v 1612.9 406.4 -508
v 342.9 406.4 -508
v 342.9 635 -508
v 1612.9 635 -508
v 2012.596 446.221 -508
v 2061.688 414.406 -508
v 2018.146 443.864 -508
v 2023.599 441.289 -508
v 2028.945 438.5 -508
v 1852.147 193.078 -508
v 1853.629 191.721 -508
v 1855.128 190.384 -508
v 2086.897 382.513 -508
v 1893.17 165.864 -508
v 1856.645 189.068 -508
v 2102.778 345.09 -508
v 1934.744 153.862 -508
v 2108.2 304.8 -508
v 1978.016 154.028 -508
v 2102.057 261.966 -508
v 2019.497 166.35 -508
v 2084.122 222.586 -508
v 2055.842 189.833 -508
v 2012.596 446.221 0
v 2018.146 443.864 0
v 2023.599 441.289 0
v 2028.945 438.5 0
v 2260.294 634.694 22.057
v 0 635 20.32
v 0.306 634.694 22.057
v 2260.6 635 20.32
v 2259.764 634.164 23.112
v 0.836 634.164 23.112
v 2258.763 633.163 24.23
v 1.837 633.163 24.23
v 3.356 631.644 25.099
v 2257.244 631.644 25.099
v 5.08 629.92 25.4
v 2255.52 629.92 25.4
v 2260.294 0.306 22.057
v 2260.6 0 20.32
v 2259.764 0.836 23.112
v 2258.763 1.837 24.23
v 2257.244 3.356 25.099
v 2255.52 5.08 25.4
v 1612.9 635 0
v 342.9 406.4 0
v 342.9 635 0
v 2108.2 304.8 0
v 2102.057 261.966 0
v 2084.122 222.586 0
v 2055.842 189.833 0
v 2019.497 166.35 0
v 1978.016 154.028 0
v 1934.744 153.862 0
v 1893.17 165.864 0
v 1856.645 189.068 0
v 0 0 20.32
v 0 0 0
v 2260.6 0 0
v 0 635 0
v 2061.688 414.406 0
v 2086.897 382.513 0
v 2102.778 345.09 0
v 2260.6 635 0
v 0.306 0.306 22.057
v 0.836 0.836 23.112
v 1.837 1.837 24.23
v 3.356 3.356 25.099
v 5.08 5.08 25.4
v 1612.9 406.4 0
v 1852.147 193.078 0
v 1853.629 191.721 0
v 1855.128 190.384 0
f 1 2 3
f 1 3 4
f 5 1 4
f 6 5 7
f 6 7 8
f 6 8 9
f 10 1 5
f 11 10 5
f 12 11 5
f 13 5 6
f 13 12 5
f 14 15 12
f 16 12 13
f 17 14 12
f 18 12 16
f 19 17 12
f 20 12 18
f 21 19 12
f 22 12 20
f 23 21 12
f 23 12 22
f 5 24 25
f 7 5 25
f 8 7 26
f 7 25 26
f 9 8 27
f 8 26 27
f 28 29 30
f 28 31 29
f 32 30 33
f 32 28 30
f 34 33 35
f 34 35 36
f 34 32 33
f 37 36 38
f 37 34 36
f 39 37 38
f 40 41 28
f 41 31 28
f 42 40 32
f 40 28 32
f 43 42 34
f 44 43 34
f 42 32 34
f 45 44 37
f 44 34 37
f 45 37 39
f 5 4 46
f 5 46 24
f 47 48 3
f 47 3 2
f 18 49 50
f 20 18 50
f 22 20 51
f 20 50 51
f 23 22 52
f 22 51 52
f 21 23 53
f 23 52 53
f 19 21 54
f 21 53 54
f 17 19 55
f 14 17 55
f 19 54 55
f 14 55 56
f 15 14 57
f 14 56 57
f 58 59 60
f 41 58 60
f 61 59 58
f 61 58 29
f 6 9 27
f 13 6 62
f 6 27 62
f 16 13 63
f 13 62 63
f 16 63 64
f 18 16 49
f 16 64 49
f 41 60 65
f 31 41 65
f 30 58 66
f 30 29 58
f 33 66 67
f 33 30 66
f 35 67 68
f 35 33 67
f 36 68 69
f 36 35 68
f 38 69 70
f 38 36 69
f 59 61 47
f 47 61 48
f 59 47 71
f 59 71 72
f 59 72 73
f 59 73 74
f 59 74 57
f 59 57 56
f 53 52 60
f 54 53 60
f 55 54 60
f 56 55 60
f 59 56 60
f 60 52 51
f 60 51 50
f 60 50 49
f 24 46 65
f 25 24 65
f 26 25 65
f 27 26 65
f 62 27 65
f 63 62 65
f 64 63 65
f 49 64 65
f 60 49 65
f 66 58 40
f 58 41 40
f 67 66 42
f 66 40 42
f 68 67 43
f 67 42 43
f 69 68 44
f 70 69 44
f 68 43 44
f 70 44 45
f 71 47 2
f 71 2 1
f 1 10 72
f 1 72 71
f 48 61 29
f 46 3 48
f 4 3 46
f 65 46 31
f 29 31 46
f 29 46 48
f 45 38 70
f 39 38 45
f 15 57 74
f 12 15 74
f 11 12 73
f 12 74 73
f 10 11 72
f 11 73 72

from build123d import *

# Parameters (mm, degrees)
F0_W     = 2260.6
F0_H     = 635
F1_DEPTH = 25.4
F2_R     = 5.08
F3_W     = 1270
F3_H     = 228.6
F4_DEPTH = 508


with BuildPart() as f1:
    # F0 (on Top) → F1 (new body)
    with BuildSketch(Plane.XY):
        with Locations((1130.3, 317.5)):
            Rectangle(F0_W, F0_H)
    extrude(amount=F1_DEPTH)

    # F2
    f2_edges = [f1.edges().sort_by_distance(p)[0] for p in [
        (0, 317.5, 25.4),
        (1130.3, 0, 25.4),
        (2260.6, 317.5, 25.4),
        (1130.3, 635, 25.4),
    ]]
    fillet(f2_edges, radius=F2_R)

    # F3 (on face) → F4 (join)
    with BuildSketch(Plane(origin=(0, 0, 0), x_dir=(1, 0, 0), z_dir=(0, 0, -1))):
        with Locations((977.9, -520.7)):
            Rectangle(F3_W, F3_H)
        with BuildLine():
            Line((1612.9, -406.4), (1612.9, -635))
            Line((1612.9, -635), (2012.596362, -446.22112))
            ThreePointArc((2012.596362, -446.22112), (1827.078225, -386.38716), (1852.147463, -193.077524))
            Line((1852.147463, -193.077524), (1612.9, -406.4))
        make_face()
        with BuildLine():
            Line((2028.944765, -438.499676), (2012.596362, -446.22112))
            ThreePointArc((2012.596362, -446.22112), (2020.88517, -442.60305), (2028.944765, -438.499676))
        make_face()
        with BuildLine():
            ThreePointArc((1852.147463, -193.077524), (1827.078225, -386.38716), (2012.596362, -446.22112))
            Line((2012.596362, -446.22112), (2028.944765, -438.499676))
            ThreePointArc((2028.944765, -438.499676), (2086.897334, -382.512605), (2108.2, -304.8))
            ThreePointArc((2108.2, -304.8), (2019.496552, -166.349614), (1856.64476, -189.067557))
            Line((1856.64476, -189.067557), (1852.147463, -193.077524))
        make_face()
        with BuildLine():
            ThreePointArc((1856.64476, -189.067557), (1854.376292, -191.050313), (1852.147463, -193.077524))
            Line((1852.147463, -193.077524), (1856.64476, -189.067557))
        make_face()
    extrude(amount=F4_DEPTH)


solid = f1.part
